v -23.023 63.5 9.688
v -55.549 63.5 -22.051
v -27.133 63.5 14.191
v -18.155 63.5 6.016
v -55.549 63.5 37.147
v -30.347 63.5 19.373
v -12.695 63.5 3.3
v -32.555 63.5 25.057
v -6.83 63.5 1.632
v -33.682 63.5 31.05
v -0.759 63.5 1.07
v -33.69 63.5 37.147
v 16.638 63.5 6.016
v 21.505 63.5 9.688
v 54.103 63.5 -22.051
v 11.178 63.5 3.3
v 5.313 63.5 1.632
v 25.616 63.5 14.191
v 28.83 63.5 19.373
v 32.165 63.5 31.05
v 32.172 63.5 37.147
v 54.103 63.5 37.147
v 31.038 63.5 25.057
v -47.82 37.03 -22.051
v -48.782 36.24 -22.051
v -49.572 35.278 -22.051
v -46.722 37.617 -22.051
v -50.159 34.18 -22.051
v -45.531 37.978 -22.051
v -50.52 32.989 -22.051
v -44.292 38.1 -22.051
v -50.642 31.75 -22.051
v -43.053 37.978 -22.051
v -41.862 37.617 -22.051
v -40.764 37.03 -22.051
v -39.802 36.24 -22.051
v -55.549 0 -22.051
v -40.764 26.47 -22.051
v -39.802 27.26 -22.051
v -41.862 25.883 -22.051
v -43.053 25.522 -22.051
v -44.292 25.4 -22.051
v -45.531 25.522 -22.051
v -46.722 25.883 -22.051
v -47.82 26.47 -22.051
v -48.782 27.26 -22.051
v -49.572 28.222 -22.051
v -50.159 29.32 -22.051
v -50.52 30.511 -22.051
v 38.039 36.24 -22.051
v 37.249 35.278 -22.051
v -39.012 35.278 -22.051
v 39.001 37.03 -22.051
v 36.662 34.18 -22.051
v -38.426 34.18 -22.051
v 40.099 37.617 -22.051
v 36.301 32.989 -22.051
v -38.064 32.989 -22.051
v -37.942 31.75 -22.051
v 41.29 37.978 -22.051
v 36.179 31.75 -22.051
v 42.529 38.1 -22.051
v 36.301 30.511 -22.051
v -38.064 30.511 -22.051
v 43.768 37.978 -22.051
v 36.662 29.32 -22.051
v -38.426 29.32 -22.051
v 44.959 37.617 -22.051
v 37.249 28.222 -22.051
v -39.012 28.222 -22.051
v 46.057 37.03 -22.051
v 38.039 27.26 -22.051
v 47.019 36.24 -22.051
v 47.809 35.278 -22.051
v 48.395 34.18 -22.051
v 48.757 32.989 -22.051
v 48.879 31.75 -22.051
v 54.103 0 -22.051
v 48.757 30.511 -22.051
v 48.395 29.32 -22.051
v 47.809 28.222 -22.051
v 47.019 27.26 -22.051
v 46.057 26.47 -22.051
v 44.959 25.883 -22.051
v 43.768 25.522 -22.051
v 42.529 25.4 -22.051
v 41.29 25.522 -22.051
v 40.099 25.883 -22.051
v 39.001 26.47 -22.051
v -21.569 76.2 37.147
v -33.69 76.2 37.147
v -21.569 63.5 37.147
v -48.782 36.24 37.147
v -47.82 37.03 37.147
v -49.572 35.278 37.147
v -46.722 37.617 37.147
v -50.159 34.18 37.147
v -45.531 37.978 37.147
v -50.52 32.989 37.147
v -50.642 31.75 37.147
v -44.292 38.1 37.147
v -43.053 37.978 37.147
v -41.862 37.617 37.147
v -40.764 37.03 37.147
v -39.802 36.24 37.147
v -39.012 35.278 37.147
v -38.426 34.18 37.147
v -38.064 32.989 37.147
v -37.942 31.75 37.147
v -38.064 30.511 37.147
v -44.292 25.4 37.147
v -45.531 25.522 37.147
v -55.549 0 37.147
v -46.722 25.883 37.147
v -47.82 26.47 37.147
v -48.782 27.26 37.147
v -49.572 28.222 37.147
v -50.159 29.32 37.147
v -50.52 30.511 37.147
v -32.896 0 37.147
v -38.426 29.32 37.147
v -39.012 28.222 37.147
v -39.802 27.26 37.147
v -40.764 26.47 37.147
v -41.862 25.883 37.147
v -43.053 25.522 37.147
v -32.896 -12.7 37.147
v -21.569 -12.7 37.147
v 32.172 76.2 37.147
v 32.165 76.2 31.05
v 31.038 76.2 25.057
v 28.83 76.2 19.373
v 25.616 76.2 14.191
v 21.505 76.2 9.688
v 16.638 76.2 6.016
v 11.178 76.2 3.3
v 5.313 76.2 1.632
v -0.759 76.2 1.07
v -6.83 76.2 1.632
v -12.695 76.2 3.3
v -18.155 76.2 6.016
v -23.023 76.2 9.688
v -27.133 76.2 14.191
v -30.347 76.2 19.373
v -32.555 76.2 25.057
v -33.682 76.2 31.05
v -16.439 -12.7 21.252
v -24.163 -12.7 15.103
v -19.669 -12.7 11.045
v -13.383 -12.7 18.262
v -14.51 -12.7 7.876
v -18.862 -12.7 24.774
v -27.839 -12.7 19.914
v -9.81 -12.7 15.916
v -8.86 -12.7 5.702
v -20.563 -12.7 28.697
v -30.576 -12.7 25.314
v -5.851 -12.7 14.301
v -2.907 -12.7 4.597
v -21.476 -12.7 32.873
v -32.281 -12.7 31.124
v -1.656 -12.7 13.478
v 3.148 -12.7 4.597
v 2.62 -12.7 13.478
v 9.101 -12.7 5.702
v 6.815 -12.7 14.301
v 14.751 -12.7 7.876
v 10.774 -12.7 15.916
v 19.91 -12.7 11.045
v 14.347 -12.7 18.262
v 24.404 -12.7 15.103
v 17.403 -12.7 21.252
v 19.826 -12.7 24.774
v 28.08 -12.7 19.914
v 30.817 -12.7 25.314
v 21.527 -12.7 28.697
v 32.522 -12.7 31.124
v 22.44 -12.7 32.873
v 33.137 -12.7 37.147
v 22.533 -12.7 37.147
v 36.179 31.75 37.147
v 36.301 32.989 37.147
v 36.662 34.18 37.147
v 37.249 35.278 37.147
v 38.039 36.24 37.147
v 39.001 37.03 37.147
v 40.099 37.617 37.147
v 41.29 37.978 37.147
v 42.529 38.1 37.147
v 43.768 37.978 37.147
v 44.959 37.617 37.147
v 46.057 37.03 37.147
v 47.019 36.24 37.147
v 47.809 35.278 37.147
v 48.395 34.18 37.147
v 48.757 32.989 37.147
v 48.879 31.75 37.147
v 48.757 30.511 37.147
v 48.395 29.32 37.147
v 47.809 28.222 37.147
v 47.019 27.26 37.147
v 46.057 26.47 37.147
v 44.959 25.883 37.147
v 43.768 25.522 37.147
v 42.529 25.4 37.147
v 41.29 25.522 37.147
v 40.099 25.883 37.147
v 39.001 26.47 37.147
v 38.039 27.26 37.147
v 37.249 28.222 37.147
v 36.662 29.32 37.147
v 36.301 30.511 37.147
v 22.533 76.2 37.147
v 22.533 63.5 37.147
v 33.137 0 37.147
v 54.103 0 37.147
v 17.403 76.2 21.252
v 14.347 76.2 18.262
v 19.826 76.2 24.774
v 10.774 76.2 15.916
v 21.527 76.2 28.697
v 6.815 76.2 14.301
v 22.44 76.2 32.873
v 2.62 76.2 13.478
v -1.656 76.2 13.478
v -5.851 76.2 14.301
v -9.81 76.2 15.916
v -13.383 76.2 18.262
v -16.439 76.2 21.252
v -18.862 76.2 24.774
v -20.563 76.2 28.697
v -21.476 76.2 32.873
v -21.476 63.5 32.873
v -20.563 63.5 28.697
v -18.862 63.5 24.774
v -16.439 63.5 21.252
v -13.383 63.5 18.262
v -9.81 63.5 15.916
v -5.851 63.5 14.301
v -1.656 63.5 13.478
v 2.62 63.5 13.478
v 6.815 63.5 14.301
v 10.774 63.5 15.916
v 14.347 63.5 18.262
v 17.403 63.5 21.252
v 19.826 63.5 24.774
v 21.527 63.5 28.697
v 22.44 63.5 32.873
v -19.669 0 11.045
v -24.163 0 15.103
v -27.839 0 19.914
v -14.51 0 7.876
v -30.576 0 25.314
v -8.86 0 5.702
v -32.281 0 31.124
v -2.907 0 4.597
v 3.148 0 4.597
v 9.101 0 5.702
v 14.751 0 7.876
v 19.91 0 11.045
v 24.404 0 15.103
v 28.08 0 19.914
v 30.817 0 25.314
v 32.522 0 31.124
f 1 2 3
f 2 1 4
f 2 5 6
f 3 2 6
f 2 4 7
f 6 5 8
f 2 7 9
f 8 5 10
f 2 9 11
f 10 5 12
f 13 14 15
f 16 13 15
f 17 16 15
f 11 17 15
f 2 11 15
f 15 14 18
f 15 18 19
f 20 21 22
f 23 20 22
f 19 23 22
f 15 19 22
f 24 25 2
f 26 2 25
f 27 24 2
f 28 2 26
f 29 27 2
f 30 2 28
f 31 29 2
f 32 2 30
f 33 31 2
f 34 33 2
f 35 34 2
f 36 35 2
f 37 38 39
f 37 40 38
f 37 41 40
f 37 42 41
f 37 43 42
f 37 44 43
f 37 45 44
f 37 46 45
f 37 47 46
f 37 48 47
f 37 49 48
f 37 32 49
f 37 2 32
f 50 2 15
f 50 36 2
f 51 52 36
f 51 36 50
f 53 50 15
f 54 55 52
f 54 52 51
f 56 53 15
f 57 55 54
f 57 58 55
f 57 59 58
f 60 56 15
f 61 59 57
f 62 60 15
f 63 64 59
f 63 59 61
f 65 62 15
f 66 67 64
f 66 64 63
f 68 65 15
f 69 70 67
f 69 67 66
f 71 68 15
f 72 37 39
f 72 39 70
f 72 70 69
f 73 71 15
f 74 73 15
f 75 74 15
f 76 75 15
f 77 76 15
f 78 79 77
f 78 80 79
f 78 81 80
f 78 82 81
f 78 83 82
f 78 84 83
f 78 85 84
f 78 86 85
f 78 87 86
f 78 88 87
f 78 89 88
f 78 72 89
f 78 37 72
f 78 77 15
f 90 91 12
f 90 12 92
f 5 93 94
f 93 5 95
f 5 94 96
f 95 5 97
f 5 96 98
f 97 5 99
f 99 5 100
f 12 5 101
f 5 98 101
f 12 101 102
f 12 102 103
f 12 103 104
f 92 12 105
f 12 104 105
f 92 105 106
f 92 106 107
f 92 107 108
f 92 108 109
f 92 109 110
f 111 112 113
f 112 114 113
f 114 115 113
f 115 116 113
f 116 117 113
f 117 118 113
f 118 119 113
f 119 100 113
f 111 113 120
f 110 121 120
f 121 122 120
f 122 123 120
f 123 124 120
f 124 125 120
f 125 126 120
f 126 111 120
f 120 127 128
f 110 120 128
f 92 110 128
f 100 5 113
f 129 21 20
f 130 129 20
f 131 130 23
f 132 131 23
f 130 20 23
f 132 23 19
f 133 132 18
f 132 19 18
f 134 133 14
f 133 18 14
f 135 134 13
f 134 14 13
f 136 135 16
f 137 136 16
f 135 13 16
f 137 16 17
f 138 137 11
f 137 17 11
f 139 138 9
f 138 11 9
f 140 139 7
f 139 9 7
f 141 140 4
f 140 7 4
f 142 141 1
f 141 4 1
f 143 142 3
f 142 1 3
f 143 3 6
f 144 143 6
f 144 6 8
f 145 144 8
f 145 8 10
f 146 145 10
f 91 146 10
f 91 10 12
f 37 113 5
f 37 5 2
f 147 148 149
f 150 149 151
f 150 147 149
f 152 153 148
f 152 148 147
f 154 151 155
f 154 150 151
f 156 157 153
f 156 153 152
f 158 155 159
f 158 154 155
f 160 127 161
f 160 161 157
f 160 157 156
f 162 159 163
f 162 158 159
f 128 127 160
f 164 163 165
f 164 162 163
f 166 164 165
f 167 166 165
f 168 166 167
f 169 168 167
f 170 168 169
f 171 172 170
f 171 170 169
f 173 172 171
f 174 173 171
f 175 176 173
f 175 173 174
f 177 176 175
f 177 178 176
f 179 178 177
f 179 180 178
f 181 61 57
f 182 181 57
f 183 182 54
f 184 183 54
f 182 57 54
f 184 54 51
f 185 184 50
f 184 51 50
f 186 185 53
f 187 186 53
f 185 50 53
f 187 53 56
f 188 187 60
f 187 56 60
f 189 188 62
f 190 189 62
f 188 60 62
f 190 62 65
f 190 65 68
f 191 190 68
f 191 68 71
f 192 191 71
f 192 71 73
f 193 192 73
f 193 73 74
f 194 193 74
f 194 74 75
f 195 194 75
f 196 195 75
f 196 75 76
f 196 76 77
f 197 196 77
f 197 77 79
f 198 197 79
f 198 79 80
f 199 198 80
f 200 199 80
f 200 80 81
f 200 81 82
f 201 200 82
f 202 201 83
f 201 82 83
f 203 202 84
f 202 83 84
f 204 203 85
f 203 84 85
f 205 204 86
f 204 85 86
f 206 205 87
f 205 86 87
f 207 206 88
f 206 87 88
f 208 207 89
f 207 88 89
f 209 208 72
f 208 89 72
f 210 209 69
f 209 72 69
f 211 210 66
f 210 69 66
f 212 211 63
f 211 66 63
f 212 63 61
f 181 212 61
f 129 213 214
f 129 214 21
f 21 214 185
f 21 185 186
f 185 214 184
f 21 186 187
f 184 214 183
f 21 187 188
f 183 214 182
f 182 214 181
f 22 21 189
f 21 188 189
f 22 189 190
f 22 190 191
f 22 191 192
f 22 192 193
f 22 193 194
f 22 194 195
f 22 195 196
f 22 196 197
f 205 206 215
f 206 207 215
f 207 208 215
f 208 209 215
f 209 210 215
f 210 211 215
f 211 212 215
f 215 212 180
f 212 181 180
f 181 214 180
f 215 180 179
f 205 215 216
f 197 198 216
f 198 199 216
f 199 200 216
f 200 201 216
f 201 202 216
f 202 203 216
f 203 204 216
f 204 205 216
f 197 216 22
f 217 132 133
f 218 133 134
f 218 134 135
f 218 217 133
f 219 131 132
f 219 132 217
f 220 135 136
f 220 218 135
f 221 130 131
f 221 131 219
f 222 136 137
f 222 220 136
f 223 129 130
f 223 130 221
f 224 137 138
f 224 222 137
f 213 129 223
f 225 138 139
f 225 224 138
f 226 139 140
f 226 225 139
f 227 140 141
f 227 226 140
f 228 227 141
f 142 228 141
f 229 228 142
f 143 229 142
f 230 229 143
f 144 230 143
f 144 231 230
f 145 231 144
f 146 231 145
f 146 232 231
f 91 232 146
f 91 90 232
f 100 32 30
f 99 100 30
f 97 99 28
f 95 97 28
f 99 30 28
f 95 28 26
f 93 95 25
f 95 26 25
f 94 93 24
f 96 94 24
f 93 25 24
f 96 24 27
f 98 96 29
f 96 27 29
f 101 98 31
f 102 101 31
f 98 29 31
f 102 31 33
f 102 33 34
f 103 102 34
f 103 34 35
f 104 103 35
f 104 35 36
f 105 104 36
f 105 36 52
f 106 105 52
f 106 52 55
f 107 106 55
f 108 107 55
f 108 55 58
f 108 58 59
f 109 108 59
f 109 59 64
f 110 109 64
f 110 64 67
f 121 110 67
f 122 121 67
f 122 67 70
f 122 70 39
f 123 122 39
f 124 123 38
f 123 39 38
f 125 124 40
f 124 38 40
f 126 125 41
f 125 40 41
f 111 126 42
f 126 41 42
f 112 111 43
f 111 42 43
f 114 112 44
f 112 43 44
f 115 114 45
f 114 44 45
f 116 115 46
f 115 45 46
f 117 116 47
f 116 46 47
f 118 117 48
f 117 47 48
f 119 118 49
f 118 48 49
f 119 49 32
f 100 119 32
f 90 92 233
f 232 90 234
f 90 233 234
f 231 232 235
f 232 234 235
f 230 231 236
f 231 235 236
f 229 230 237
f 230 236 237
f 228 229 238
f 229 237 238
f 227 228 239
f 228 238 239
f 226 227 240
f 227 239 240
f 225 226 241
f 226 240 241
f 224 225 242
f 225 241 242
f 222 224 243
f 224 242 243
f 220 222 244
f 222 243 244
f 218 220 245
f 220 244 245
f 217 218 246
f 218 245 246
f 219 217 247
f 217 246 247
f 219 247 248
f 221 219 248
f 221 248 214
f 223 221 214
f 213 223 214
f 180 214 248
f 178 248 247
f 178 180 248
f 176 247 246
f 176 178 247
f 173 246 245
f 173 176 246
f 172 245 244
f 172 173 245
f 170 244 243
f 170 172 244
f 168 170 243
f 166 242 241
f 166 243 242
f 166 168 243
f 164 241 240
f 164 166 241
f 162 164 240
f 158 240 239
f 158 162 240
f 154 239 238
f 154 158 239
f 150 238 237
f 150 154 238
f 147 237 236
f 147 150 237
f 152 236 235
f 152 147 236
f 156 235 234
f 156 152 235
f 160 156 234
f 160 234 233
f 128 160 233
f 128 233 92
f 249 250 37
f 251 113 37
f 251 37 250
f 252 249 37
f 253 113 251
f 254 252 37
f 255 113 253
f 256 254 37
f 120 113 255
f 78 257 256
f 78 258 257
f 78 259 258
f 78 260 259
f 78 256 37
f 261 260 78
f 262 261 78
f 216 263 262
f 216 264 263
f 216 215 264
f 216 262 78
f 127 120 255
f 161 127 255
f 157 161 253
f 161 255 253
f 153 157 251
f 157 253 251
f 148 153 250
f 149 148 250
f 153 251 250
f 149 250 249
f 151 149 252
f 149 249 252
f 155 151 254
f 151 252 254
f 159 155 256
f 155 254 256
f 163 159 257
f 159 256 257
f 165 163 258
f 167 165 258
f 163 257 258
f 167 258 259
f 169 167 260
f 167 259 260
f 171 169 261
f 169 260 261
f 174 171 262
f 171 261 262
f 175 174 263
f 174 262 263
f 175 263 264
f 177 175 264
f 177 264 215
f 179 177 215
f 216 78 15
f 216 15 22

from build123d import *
from build123d import SkipClean  # not in build123d's __all__

# Parameters (mm, degrees)
F1_DEPTH = 63.5
F3_DEPTH = 12.7
F4_DEPTH = 63.501
F6_DEPTH = 12.7
F8_D     = 12.7
F8_DEPTH = 152.4
F8_TIP   = 3.8154649308


# Not quite as in the source:
# - after a boolean that leaves OpenCascade's solid faulty, fix() repairs it


with BuildPart() as f1:
    # F0 (on Front) → F1 (new body)
    with BuildSketch(Plane.XZ):
        Polygon((-29.9473897851, 37.1472596026), (-42.7499328044, 37.1472596026), (-55.5491112173, 37.1472596026), (-55.5491112173, -22.0509488136), (54.1031509638, -22.0509488136), (54.1031509638, 37.1472596026), (41.2416318434, 37.1472596026), (28.4390888242, 37.1472596026), (20.3639920801, 37.1472596026), (-23.0149235576, 37.1472596026), align=None)
    extrude(amount=-F1_DEPTH)

    # F2 (on face) → F3 (join)
    with BuildSketch(Plane.XZ):
        with BuildLine():
            Line((-21.5689614415, 37.1472596026), (-32.8956767917, 37.1472596026))
            ThreePointArc((-32.8956767917, 37.1472596026), (0.1204963773, 4.4575092605), (33.1366695464, 37.1472596026))
            Line((33.1366695464, 37.1472596026), (22.5329399109, 37.1472596026))
            ThreePointArc((22.5329399109, 37.1472596026), (0.4819892347, 13.3748375843), (-21.5689614415, 37.1472596026))
        make_face()
    extrude(amount=F3_DEPTH)

    # F4 (cut, through all): a face of the model
    f4_faces = [f1.faces().sort_by_distance(p)[0] for p in [
        (0.4819892347, 0, 26.9928771395),
    ]]
    extrude(f4_faces, amount=-F4_DEPTH, mode=Mode.SUBTRACT)

    # F5 (on face) → F6 (join)
    with BuildSketch(Plane(origin=(0, 63.5, 0), x_dir=(-1, 0, 0), z_dir=(0, 1, 0))):
        with BuildLine():
            Line((-22.5329399109, 37.1472596026), (-32.1724079549, 37.1472596026))
            ThreePointArc((-32.1724079549, 37.1472596026), (0.7585827261, 1.0699512778), (33.6895734072, 37.1472596026))
            Line((33.6895734072, 37.1472596026), (21.5689614415, 37.1472596026))
            ThreePointArc((21.5689614415, 37.1472596026), (-0.4819892347, 13.3748375843), (-22.5329399109, 37.1472596026))
        make_face()
    with SkipClean():  # cleaning this boolean's faces spoils the solid; the shape is the same uncleaned
        extrude(amount=F6_DEPTH)

    # F8
    with Locations(Plane.XY.offset(37.1472596026)):
        with Locations((-44.2922338843, 31.75), (42.5287522376, 31.75)):
            Hole(F8_D / 2, depth=F8_DEPTH)
            with Locations((0, 0, -(F8_DEPTH + F8_TIP / 2))):  # 118° drill point
                Cone(0, F8_D / 2, F8_TIP, mode=Mode.SUBTRACT)

    add(f1.part.fix(), mode=Mode.REPLACE)


solid = f1.part
